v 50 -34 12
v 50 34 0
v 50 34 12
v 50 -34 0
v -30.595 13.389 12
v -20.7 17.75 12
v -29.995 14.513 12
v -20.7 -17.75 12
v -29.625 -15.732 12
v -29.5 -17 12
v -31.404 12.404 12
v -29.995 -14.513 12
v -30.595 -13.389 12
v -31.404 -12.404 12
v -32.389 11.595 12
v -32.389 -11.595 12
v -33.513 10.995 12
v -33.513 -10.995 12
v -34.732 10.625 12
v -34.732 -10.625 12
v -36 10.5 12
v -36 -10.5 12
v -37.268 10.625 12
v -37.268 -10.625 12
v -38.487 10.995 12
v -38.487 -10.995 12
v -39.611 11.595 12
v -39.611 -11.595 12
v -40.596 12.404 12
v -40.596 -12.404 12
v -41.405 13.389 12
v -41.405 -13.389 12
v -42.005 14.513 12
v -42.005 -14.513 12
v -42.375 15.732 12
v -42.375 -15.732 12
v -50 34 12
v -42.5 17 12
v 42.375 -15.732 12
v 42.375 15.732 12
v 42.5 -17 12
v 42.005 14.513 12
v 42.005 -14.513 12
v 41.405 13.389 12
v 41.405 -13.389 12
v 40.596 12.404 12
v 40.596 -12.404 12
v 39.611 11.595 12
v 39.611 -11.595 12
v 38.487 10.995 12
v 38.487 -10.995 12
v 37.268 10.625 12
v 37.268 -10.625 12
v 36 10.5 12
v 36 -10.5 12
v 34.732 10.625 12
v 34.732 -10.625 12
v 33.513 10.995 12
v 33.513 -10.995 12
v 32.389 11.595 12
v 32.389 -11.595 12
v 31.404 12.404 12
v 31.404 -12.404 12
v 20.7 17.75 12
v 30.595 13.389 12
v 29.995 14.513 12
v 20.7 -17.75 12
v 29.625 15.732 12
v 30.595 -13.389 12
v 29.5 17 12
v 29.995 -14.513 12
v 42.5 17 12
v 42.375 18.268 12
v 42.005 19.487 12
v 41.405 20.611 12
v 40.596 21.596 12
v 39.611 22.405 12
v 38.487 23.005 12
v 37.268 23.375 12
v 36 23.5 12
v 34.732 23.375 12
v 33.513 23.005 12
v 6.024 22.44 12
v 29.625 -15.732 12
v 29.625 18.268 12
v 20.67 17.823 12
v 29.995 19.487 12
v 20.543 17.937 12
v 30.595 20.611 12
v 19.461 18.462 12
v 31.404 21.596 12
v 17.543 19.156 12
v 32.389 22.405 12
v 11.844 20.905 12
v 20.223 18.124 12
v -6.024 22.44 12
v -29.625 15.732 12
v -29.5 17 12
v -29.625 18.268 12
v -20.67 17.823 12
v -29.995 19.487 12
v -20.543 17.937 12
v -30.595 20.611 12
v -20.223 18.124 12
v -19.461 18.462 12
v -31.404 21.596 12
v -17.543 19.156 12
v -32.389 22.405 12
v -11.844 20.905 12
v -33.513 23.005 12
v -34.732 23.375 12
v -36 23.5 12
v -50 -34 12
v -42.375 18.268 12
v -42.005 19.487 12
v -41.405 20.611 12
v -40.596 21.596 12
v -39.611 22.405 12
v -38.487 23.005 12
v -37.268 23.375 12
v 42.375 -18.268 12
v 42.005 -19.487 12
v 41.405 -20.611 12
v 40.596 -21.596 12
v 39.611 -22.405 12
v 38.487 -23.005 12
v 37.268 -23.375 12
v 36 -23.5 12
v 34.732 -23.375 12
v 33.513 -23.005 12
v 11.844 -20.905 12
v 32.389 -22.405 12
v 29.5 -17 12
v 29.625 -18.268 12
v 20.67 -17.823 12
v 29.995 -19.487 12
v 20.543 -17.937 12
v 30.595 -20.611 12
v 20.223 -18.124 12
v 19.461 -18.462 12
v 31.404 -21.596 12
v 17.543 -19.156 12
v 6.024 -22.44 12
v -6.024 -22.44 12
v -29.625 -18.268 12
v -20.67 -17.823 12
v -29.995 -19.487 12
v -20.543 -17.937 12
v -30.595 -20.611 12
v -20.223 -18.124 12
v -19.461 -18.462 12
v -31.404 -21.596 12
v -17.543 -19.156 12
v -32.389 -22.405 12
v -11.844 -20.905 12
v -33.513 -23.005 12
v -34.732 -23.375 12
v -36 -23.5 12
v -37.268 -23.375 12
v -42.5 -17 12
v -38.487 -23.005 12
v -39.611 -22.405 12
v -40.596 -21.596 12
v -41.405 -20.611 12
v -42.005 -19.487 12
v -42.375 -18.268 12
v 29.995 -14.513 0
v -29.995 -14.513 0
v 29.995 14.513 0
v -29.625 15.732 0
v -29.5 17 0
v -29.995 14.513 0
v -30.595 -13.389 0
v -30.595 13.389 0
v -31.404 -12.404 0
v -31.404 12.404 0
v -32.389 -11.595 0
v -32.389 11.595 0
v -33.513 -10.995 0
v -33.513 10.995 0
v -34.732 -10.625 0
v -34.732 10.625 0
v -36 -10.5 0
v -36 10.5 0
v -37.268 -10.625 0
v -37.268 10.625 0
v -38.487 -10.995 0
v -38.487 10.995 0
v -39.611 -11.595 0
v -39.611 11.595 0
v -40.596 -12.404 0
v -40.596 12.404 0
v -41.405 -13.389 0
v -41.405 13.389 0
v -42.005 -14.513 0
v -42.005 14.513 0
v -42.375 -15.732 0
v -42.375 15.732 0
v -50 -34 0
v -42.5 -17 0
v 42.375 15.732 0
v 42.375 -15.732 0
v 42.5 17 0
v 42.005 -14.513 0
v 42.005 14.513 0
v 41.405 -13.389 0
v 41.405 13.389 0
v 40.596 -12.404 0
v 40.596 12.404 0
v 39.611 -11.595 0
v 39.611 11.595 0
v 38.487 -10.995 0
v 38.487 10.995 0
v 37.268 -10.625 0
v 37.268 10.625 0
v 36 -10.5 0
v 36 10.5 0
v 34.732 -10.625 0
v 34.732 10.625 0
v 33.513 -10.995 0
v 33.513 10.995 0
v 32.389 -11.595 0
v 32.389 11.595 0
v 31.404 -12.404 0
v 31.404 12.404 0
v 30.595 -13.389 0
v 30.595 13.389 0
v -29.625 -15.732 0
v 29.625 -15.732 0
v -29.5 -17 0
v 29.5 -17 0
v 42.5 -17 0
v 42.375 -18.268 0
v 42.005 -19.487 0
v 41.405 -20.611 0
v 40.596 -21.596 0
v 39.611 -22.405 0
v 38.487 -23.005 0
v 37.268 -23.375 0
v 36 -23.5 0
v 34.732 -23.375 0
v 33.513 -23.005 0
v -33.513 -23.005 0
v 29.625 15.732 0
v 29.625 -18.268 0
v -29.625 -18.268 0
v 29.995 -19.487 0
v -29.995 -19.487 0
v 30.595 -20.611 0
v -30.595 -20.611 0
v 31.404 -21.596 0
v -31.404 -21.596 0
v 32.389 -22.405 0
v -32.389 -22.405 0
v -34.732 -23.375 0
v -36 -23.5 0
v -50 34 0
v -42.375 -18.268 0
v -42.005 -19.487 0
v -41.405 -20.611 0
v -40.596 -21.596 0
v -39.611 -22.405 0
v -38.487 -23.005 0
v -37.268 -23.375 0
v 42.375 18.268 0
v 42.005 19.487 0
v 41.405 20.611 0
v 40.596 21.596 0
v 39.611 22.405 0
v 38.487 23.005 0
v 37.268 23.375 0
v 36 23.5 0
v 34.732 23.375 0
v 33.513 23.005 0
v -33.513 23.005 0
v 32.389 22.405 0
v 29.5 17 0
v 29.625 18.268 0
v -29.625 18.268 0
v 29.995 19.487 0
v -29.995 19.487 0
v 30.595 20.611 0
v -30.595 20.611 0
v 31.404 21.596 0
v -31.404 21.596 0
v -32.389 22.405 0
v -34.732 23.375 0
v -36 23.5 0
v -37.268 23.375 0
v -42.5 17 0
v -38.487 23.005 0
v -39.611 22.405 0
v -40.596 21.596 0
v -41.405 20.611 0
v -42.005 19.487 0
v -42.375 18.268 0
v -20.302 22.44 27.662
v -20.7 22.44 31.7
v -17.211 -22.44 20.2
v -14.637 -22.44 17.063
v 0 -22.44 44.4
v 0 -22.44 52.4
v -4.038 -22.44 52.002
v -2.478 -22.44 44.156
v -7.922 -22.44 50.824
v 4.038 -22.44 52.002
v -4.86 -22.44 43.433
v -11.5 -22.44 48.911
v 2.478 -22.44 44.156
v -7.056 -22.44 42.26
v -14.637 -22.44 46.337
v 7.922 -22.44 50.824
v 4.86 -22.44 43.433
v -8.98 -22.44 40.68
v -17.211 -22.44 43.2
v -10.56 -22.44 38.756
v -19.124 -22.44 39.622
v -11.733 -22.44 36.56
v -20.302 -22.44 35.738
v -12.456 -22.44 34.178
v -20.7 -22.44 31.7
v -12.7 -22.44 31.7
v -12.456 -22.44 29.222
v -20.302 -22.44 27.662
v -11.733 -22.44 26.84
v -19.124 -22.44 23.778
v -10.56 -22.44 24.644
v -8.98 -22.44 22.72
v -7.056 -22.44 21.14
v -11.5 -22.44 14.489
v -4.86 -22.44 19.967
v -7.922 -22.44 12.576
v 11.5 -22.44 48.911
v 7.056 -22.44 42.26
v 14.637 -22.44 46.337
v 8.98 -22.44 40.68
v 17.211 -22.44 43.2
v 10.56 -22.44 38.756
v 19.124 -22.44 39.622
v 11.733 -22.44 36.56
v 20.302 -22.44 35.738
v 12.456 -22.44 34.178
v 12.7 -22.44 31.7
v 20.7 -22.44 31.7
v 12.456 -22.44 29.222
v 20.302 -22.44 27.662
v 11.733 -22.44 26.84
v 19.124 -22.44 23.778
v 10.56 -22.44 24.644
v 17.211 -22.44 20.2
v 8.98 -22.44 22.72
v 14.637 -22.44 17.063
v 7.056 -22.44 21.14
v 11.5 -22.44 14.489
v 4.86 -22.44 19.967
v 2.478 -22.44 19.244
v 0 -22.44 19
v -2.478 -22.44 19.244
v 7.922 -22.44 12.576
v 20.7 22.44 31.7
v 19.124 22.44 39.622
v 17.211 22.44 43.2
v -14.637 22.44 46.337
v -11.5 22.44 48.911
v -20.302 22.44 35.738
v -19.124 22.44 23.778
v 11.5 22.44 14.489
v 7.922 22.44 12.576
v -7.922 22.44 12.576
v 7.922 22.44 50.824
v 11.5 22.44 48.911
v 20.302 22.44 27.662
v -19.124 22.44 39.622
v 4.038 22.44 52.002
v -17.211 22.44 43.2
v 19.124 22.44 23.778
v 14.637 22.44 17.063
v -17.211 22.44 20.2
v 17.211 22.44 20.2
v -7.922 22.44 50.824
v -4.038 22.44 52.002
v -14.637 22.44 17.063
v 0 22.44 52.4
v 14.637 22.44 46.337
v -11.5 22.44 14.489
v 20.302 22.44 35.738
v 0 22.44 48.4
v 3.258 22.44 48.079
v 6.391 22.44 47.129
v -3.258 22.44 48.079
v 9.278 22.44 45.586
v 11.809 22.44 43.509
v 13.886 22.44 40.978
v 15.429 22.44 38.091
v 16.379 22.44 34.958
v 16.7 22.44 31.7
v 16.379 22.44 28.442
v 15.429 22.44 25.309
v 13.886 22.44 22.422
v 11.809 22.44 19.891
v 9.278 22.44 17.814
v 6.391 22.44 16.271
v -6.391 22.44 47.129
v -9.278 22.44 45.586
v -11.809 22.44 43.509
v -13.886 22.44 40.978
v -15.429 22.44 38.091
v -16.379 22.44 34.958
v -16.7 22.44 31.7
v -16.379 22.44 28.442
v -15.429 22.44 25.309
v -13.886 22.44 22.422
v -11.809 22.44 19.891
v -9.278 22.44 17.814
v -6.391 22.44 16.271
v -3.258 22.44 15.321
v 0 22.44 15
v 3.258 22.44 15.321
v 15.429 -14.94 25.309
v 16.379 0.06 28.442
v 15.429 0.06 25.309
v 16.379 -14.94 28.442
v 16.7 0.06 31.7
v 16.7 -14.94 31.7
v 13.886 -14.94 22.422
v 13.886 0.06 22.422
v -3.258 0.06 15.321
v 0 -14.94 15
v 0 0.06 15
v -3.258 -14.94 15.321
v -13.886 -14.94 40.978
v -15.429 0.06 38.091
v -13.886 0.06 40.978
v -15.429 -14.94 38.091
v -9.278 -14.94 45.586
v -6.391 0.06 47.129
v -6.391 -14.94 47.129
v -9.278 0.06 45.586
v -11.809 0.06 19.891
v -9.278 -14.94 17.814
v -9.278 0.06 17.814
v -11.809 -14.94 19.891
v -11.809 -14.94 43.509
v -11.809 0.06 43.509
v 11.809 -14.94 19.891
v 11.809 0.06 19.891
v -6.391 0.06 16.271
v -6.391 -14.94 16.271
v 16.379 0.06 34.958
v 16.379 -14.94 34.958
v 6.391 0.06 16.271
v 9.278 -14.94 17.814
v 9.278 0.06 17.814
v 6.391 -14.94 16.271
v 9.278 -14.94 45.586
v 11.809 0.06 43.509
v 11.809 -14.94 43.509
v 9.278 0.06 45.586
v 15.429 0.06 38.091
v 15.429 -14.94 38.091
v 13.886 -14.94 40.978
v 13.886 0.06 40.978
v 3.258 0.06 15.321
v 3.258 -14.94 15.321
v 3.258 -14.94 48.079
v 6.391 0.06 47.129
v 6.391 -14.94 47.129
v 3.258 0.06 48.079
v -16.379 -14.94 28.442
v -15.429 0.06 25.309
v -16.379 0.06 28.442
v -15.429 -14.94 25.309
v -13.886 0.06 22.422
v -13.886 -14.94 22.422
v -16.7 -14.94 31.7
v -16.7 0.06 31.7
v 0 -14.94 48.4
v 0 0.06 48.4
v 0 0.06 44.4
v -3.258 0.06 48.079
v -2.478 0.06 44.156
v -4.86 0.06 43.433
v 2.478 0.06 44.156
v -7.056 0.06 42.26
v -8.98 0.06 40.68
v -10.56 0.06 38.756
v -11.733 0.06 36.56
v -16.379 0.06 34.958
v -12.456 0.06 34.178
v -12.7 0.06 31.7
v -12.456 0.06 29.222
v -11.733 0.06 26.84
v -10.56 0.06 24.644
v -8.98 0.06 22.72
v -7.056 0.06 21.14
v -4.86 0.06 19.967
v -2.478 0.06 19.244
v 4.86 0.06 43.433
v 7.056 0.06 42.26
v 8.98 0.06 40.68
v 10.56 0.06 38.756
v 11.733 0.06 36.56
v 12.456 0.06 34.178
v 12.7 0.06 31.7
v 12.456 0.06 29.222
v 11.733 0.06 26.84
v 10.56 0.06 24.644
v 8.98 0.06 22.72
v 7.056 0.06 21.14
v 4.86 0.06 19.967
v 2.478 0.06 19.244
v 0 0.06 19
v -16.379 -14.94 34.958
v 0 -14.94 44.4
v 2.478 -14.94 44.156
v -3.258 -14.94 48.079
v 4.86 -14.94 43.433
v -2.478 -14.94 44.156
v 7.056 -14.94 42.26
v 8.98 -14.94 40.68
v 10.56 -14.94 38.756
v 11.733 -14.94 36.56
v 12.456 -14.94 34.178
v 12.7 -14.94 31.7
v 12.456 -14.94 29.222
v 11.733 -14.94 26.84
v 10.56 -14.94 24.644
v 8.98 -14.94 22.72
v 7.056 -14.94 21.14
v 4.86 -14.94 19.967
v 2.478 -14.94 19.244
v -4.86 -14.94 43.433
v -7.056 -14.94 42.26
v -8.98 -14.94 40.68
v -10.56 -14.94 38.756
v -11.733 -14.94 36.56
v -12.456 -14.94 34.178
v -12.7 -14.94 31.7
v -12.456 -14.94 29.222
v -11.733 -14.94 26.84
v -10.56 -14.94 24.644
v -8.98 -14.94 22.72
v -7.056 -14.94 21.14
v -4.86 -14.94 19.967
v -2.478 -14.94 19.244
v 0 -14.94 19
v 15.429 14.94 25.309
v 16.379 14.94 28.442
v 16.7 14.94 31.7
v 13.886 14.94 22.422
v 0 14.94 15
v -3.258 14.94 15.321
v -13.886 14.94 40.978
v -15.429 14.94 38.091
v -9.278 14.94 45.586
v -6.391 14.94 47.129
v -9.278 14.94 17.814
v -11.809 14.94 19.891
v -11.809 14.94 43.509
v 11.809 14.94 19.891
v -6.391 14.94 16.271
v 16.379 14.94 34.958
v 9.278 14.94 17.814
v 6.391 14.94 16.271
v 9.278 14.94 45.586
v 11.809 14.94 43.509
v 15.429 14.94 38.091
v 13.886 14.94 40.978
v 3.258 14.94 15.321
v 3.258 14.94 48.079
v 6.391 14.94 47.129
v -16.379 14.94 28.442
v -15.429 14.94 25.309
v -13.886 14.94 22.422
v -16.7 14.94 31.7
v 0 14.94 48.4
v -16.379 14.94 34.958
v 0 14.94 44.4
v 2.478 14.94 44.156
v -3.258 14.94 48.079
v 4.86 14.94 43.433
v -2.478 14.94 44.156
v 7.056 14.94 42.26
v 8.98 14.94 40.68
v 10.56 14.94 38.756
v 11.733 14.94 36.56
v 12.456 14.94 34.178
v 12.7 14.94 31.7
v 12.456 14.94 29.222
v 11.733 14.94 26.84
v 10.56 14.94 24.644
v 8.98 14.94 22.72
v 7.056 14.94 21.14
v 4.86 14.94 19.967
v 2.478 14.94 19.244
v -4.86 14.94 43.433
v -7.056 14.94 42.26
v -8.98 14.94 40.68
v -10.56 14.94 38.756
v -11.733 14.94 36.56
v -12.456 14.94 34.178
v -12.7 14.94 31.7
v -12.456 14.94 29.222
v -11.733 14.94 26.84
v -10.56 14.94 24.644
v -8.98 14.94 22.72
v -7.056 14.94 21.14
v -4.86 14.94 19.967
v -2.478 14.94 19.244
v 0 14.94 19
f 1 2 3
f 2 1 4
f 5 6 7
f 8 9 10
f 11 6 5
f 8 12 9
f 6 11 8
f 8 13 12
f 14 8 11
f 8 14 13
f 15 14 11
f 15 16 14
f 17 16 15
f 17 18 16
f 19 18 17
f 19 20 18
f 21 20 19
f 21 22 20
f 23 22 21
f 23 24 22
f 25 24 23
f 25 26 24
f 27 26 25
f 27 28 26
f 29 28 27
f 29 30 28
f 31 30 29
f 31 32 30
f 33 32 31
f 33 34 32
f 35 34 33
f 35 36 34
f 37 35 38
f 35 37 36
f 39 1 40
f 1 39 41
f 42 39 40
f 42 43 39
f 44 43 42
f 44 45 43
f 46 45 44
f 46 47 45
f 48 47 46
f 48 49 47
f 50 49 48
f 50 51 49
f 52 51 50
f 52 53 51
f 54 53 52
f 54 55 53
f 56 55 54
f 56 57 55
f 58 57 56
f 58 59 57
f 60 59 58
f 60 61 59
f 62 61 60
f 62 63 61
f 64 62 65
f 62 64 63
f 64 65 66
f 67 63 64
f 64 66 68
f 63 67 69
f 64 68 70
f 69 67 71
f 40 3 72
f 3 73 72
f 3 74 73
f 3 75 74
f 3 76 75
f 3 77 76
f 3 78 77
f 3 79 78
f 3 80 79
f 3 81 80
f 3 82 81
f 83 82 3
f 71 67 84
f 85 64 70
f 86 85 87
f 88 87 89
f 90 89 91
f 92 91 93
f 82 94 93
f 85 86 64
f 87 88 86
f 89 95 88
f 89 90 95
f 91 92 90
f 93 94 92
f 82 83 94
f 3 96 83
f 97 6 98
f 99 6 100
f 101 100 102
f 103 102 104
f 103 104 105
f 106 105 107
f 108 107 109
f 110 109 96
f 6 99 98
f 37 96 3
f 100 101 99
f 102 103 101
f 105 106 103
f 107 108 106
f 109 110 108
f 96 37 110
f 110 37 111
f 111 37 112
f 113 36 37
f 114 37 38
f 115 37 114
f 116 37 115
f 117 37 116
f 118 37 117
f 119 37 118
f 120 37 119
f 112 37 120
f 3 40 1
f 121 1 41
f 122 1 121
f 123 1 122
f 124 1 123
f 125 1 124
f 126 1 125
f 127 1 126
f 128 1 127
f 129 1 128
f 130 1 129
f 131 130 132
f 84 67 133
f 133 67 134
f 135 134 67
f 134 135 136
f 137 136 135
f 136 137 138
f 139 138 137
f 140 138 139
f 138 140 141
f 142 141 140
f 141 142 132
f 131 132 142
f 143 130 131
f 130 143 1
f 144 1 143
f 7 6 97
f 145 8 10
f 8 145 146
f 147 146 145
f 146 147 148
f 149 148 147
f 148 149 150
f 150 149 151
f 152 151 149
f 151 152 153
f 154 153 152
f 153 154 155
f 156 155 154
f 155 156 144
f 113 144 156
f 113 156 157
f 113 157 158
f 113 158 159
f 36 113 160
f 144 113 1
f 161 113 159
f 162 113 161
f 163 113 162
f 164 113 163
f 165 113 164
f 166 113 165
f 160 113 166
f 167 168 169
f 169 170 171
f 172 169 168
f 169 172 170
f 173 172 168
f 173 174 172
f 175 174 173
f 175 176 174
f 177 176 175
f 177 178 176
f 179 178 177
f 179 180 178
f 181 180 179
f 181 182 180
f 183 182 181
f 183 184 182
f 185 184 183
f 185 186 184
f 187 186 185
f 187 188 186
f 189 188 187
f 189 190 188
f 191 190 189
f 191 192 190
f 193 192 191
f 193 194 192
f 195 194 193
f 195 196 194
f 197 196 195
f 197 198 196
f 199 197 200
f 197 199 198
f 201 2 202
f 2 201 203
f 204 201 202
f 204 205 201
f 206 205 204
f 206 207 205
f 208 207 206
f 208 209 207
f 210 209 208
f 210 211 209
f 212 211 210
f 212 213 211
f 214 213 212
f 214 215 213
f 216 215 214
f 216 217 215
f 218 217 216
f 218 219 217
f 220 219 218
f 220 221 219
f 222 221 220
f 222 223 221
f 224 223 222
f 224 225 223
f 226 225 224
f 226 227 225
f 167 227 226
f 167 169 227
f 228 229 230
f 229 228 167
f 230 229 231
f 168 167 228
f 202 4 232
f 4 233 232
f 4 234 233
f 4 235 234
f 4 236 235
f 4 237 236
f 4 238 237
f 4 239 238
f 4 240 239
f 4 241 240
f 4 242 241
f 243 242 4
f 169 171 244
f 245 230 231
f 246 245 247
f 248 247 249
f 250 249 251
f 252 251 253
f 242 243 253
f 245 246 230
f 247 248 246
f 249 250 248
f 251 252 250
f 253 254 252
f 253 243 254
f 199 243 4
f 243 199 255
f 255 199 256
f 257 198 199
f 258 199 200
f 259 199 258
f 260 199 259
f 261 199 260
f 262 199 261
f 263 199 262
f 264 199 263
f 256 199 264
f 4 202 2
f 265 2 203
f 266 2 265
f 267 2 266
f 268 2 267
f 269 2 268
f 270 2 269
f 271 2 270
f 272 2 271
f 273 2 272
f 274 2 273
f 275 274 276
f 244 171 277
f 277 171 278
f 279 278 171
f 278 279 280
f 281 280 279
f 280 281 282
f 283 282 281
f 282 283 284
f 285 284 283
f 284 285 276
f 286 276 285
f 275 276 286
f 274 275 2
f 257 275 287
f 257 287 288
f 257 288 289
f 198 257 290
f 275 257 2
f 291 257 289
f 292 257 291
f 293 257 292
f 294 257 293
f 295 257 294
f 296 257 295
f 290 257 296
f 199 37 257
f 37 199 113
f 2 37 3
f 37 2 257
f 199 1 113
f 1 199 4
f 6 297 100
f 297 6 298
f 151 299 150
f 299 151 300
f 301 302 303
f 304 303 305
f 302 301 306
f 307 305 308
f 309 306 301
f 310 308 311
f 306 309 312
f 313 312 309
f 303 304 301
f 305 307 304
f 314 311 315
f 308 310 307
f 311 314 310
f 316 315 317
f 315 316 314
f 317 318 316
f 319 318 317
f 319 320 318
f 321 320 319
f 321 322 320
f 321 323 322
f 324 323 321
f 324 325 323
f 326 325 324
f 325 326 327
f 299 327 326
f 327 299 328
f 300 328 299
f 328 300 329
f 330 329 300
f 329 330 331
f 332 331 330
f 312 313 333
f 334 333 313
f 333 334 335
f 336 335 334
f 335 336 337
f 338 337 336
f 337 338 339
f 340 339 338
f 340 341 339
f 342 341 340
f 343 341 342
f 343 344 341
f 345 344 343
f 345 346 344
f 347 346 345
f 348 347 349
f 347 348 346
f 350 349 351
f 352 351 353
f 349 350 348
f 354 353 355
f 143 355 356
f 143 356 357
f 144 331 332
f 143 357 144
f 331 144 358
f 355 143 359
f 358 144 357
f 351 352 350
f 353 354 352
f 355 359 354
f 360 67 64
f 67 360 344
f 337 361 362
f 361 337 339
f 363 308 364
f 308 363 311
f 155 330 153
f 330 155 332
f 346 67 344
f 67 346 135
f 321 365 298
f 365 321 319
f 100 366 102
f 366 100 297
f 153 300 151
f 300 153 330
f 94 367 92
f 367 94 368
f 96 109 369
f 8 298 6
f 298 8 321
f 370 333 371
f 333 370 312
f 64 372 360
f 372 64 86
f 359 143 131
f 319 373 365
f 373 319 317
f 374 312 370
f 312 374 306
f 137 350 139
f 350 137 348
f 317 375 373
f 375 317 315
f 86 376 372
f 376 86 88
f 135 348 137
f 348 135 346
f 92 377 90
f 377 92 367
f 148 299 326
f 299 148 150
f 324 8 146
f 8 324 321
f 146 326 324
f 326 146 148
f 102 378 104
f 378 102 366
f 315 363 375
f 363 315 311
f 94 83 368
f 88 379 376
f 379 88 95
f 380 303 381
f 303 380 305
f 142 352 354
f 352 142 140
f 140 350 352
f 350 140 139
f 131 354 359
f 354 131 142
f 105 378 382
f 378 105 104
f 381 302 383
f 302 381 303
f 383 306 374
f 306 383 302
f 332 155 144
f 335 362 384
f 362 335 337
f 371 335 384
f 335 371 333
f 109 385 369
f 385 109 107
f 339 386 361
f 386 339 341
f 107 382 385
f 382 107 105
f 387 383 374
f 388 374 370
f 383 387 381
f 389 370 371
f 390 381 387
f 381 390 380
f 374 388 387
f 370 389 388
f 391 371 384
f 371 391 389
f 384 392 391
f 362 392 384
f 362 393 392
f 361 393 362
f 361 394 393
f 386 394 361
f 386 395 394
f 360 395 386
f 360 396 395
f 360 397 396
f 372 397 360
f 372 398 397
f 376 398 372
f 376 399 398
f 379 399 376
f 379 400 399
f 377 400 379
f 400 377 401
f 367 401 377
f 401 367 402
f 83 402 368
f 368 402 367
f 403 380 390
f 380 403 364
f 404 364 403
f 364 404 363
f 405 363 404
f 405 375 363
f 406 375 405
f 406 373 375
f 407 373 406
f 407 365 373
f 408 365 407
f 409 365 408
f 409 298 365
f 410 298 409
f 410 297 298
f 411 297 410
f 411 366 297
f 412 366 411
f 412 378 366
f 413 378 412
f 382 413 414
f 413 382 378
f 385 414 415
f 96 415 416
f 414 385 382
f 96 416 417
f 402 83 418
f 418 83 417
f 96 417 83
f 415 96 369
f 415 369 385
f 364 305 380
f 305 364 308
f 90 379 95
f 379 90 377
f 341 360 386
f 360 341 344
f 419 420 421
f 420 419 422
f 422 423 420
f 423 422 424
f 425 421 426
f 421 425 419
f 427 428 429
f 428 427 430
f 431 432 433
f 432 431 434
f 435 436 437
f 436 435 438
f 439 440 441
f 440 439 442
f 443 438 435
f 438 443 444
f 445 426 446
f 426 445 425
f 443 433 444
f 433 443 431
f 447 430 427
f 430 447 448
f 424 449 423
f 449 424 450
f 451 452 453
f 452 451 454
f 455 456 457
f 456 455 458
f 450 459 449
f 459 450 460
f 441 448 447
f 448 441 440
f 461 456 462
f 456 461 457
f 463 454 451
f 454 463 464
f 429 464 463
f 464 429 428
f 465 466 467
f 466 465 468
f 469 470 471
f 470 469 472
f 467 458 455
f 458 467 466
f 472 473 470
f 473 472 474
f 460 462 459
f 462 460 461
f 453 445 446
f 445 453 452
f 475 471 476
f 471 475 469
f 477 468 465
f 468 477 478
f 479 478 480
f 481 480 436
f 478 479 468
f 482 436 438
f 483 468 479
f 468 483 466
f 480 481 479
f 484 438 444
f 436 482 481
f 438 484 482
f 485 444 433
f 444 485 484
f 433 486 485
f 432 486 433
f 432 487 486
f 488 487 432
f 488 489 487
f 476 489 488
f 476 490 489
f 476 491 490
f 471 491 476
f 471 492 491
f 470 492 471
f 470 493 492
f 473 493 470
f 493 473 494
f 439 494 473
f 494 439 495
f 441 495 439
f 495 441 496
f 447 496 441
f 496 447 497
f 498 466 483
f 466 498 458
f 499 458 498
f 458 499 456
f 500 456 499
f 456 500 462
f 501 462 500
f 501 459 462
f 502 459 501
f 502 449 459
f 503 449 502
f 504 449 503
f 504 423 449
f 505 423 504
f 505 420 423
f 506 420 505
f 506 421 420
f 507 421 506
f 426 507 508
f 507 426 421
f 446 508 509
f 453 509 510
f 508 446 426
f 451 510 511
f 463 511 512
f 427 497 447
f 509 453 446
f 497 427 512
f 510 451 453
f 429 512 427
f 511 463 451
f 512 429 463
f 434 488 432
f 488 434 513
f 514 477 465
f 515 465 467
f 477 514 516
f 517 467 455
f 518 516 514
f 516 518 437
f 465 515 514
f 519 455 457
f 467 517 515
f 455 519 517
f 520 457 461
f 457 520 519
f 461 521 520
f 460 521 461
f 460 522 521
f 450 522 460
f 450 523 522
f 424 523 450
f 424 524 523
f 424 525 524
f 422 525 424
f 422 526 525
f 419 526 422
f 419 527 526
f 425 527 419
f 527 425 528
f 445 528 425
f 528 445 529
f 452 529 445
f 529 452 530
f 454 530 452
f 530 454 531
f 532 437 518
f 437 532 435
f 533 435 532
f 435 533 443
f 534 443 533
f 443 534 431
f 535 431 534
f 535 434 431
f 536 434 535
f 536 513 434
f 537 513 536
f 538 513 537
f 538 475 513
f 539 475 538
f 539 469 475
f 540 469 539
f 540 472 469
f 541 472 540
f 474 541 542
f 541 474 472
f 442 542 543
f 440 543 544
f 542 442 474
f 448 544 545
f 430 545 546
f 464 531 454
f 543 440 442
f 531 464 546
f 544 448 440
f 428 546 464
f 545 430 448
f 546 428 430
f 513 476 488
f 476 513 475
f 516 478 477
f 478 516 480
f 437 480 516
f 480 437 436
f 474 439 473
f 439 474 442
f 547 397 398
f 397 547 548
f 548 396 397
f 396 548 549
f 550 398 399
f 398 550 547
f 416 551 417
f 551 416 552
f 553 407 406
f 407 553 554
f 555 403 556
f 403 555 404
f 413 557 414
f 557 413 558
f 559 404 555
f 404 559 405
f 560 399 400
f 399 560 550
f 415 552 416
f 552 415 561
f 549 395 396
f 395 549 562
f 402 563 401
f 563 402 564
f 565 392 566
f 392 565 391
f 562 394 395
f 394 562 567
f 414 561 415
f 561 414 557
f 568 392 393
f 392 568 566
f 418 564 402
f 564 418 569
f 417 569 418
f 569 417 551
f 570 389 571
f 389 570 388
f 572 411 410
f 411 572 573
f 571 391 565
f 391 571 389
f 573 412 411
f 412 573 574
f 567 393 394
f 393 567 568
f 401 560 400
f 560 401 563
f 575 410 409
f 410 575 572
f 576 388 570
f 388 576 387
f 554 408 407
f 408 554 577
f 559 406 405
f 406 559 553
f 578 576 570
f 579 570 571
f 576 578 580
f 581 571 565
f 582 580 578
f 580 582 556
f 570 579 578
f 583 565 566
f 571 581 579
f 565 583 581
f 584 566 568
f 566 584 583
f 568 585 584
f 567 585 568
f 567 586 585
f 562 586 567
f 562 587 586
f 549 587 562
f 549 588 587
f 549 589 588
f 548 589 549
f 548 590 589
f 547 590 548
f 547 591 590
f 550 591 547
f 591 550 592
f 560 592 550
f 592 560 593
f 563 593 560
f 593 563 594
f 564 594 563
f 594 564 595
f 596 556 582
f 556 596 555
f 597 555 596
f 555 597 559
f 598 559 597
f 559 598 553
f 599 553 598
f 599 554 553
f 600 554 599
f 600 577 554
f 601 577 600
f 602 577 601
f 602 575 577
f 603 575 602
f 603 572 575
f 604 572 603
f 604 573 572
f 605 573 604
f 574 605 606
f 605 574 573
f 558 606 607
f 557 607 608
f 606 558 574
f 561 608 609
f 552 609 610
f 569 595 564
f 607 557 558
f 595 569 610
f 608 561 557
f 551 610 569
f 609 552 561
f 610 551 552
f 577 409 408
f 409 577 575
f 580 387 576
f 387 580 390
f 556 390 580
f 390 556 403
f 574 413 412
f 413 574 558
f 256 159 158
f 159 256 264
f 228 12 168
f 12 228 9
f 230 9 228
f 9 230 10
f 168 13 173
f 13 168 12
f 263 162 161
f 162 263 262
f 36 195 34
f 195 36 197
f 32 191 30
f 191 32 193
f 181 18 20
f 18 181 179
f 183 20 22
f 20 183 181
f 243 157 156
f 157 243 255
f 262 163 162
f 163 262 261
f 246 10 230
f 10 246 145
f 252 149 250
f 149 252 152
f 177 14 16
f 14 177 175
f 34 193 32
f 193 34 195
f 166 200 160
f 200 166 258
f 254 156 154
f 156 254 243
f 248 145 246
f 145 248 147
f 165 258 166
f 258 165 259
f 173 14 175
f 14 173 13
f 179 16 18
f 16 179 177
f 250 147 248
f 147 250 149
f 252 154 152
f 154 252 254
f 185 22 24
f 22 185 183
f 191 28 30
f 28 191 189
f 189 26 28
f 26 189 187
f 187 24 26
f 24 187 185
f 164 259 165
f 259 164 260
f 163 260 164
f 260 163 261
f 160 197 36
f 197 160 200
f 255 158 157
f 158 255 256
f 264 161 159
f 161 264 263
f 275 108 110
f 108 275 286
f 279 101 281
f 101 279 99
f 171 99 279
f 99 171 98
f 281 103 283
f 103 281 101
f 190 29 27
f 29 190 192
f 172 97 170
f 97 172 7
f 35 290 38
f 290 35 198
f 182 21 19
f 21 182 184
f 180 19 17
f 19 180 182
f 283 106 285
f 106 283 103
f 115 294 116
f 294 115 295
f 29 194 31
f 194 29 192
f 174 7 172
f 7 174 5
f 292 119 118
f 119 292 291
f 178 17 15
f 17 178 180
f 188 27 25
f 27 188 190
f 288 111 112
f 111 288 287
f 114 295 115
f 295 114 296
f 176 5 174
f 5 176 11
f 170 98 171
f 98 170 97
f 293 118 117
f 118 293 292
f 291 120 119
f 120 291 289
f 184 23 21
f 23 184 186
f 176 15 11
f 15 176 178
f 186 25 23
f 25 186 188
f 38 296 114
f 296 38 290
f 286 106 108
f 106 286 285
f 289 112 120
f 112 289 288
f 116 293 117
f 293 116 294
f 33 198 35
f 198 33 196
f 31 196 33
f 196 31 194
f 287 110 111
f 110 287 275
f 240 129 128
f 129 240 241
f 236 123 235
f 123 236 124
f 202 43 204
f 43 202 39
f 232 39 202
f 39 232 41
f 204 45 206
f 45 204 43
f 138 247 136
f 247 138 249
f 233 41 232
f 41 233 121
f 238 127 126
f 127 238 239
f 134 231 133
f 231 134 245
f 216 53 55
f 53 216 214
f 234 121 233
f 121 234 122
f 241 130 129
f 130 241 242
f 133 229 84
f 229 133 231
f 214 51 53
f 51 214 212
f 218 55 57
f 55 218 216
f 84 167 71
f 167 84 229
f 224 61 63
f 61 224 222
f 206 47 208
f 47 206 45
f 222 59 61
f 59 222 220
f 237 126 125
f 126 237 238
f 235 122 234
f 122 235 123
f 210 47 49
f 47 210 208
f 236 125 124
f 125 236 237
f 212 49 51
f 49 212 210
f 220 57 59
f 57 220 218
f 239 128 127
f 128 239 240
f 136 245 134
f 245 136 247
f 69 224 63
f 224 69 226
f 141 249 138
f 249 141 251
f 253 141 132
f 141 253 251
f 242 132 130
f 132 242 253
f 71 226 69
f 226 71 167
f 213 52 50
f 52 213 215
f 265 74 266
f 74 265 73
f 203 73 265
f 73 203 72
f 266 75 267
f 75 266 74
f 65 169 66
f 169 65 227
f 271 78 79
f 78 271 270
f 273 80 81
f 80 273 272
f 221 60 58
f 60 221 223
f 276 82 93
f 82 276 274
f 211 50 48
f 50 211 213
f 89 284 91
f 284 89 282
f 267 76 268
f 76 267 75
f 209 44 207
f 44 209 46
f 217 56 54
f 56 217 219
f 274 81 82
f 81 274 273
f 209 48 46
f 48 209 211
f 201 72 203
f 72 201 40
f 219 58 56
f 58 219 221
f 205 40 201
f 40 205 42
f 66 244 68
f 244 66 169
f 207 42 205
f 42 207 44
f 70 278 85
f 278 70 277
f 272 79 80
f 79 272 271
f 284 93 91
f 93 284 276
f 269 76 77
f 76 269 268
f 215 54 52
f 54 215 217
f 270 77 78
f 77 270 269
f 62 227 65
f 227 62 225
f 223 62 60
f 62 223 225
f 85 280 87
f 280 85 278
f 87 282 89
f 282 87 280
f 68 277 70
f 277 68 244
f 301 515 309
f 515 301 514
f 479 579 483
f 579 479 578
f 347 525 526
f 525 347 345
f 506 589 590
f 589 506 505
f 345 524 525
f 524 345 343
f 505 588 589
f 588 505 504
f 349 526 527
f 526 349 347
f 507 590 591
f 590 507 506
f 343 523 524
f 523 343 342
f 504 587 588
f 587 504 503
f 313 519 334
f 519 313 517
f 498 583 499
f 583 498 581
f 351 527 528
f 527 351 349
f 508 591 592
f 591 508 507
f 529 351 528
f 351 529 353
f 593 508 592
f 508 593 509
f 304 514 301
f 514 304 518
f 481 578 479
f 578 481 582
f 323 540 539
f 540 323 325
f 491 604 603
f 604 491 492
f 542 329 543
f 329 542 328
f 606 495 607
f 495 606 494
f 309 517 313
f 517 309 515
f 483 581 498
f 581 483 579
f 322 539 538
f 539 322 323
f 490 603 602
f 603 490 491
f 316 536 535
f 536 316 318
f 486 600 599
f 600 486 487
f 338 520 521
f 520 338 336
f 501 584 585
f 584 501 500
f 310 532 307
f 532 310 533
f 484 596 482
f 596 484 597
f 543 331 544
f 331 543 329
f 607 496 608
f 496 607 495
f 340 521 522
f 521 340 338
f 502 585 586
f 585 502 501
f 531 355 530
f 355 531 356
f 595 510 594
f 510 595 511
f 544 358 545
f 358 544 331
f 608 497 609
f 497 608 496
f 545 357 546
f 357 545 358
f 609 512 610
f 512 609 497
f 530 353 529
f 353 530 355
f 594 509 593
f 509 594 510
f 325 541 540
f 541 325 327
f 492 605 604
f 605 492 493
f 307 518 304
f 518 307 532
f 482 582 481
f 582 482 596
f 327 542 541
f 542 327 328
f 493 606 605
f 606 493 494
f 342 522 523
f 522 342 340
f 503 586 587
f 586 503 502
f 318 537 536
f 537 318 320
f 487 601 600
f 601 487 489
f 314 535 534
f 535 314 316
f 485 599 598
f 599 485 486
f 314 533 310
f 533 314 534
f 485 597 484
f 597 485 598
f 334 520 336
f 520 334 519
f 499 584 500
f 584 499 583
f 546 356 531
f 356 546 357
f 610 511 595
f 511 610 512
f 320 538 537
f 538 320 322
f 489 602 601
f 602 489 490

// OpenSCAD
$fn = 32;

// ----------------------------------------------------------------------
// Bearing block: 100 x 68 mm base, 25.4 mm bore at 31.7 mm
// ----------------------------------------------------------------------

// --- parameters (mm) ---
base_w = 100;             // base width
base_d = 68;              // base depth
base_t = 12;              // base thickness
bore_d = 25.4;            // shaft / bearing bore
house_r = 20.7;           // housing outer radius
house_len = 44.88;        // housing length along the shaft
foot_w = 41.4;            // foot width under the housing
foot_len = 34.88;         // foot length along the shaft
axis_z = 31.7;            // bore axis height above the base
holes_d = 13;             // mounting holes
hole_x = 36;              // mounting hole spacing
seat_d = 10;              // bearing seat depth
seat_wall = 4;            // seat wall thickness

difference() {
  union() {
    /* base plate with its underside on z = 0 */
    translate([0, 0, base_t / 2]) cube([base_w, base_d, base_t], center = true);
    /* hull foot: a straight web blending into the round housing */
    hull() {
      translate([0, 0, base_t - 0.5]) cube([foot_w, foot_len, 1.6], center = true);
      translate([0, 0, axis_z]) rotate([-90, 0, 0]) cylinder(h = house_len, d = 2 * house_r, center = true);
    }
  }
  /* bore through the housing, 2.5 mm clear on both sides */
  translate([0, 0, axis_z]) rotate([-90, 0, 0]) cylinder(h = house_len + 5, d = bore_d, center = true);
  /* bearing seats, recessed into both ends of the housing */
  for (sy = [-1, 1]) {
    translate([0, sy * (house_len / 2 - seat_d + 2.5), axis_z]) rotate([-90, 0, 0]) cylinder(h = seat_d + 5, d = bore_d + 2 * seat_wall);
  }
  /* mounting holes through the base plate */
  for (hx = [-36, 36]) {
    for (hy = [-17, 17]) {
      translate([hx, hy, -2.5]) cylinder(h = base_t + 5, d = holes_d);
    }
  }
}
